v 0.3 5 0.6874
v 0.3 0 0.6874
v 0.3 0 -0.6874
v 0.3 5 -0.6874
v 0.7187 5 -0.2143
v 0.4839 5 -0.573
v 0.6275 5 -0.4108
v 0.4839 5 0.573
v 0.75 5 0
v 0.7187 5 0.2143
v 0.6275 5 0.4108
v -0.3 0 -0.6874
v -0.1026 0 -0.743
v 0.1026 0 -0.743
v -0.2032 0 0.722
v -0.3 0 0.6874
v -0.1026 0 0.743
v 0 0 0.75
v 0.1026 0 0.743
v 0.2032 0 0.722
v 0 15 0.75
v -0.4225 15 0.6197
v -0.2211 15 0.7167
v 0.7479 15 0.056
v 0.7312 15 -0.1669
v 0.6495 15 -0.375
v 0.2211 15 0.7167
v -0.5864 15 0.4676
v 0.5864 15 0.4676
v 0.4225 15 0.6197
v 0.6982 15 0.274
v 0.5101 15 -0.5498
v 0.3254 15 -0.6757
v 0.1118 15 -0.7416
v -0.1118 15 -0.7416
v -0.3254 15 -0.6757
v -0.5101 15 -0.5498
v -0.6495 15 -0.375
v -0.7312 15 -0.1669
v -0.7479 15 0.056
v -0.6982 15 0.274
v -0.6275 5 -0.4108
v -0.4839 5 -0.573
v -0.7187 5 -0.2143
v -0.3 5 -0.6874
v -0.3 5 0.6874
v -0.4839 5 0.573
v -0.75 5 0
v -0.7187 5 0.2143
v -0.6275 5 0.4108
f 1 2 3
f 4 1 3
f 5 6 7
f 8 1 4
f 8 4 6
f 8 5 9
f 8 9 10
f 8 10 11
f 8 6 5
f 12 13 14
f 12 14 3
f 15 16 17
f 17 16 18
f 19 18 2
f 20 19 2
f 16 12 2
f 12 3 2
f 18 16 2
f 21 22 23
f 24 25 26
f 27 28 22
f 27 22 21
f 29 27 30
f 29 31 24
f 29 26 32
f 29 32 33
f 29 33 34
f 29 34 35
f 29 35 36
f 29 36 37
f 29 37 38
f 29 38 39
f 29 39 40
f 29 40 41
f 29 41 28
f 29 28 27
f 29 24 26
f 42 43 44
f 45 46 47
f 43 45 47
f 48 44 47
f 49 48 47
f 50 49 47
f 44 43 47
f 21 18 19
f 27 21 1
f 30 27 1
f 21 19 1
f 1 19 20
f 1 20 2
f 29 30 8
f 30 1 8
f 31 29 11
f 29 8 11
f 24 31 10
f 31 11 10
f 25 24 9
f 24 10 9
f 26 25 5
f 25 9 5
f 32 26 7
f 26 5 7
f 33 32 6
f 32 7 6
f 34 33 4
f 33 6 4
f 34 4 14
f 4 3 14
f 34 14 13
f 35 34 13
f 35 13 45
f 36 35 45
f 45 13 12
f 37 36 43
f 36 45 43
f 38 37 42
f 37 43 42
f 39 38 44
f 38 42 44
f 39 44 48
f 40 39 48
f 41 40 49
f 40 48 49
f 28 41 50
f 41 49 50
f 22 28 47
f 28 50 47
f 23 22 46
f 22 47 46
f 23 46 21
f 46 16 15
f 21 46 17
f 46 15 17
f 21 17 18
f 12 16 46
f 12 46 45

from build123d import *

# Parameters (mm, degrees)
SKETCH1_R           = 0.75
BOSS_EXTRUDE1_DEPTH = 15
CUT_EXTRUDE1_DEPTH  = 5


with BuildPart() as part:
    # Sketch1 → Boss-Extrude1 (new body)
    with BuildSketch(Plane(origin=(0, 0, 0), x_dir=(1, 0, 0), z_dir=(0, 1, 0))):
        with Locations(Location((0, 0, 0), (0, 0, 270))):
            Circle(SKETCH1_R)
    extrude(amount=BOSS_EXTRUDE1_DEPTH)

    # Sketch2 → Cut-Extrude1 (cut)
    with BuildSketch(Plane.XZ):
        with BuildLine():
            Line((-0.3, 0.687386354), (-0.3, -0.687386354))
            ThreePointArc((-0.3, -0.687386354), (-0.75, 0), (-0.3, 0.687386354))
        make_face()
        with BuildLine():
            Line((0.3, 0.687386354), (0.3, -0.687386354))
            ThreePointArc((0.3, -0.687386354), (0.75, 0), (0.3, 0.687386354))
        make_face()
    extrude(amount=-CUT_EXTRUDE1_DEPTH, mode=Mode.SUBTRACT)


solid = part.part
